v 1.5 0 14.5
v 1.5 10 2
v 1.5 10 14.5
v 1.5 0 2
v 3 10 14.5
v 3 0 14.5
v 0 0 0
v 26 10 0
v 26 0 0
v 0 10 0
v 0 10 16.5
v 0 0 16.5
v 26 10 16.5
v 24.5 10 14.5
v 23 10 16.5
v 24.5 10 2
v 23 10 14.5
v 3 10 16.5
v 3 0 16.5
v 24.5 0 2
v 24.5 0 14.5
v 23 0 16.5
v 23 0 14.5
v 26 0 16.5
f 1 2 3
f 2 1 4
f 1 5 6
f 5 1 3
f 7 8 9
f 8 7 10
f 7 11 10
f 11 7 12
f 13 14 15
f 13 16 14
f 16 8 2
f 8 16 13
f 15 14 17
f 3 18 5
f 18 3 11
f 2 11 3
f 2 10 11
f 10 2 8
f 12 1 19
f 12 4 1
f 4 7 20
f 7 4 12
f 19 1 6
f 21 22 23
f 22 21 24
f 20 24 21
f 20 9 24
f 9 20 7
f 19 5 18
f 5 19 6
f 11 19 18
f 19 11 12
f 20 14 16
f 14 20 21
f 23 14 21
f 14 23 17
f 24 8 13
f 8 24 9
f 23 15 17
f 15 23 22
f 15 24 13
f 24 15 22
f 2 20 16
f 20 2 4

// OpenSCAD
/*
 * Experimental micro servo mount for screwless mounting
 * (meant to be printed upright with the clip facing upwards)
 * @author: Suyash Kumar <suyash@suyashkumar.com>
 */

// All measurements in mm
servo_length = 23; 
servo_holder_width = 10; 
servo_holder_height = 13;

clip_width = 1.5; 


module servo_clip_handle() {
    union() {
        cube([clip_width, servo_holder_width, servo_holder_height + 1.5]);
        translate([0, 0, servo_holder_height + 1.5])cube([3, servo_holder_width, 2]);
    }
}

module servo_clip(){
    union() {
        cube([25,10,2]);
        servo_clip_handle();
        translate([servo_length + 2*clip_width, 0,0])mirror([1,0,0])servo_clip_handle();
    }
}

servo_clip();
